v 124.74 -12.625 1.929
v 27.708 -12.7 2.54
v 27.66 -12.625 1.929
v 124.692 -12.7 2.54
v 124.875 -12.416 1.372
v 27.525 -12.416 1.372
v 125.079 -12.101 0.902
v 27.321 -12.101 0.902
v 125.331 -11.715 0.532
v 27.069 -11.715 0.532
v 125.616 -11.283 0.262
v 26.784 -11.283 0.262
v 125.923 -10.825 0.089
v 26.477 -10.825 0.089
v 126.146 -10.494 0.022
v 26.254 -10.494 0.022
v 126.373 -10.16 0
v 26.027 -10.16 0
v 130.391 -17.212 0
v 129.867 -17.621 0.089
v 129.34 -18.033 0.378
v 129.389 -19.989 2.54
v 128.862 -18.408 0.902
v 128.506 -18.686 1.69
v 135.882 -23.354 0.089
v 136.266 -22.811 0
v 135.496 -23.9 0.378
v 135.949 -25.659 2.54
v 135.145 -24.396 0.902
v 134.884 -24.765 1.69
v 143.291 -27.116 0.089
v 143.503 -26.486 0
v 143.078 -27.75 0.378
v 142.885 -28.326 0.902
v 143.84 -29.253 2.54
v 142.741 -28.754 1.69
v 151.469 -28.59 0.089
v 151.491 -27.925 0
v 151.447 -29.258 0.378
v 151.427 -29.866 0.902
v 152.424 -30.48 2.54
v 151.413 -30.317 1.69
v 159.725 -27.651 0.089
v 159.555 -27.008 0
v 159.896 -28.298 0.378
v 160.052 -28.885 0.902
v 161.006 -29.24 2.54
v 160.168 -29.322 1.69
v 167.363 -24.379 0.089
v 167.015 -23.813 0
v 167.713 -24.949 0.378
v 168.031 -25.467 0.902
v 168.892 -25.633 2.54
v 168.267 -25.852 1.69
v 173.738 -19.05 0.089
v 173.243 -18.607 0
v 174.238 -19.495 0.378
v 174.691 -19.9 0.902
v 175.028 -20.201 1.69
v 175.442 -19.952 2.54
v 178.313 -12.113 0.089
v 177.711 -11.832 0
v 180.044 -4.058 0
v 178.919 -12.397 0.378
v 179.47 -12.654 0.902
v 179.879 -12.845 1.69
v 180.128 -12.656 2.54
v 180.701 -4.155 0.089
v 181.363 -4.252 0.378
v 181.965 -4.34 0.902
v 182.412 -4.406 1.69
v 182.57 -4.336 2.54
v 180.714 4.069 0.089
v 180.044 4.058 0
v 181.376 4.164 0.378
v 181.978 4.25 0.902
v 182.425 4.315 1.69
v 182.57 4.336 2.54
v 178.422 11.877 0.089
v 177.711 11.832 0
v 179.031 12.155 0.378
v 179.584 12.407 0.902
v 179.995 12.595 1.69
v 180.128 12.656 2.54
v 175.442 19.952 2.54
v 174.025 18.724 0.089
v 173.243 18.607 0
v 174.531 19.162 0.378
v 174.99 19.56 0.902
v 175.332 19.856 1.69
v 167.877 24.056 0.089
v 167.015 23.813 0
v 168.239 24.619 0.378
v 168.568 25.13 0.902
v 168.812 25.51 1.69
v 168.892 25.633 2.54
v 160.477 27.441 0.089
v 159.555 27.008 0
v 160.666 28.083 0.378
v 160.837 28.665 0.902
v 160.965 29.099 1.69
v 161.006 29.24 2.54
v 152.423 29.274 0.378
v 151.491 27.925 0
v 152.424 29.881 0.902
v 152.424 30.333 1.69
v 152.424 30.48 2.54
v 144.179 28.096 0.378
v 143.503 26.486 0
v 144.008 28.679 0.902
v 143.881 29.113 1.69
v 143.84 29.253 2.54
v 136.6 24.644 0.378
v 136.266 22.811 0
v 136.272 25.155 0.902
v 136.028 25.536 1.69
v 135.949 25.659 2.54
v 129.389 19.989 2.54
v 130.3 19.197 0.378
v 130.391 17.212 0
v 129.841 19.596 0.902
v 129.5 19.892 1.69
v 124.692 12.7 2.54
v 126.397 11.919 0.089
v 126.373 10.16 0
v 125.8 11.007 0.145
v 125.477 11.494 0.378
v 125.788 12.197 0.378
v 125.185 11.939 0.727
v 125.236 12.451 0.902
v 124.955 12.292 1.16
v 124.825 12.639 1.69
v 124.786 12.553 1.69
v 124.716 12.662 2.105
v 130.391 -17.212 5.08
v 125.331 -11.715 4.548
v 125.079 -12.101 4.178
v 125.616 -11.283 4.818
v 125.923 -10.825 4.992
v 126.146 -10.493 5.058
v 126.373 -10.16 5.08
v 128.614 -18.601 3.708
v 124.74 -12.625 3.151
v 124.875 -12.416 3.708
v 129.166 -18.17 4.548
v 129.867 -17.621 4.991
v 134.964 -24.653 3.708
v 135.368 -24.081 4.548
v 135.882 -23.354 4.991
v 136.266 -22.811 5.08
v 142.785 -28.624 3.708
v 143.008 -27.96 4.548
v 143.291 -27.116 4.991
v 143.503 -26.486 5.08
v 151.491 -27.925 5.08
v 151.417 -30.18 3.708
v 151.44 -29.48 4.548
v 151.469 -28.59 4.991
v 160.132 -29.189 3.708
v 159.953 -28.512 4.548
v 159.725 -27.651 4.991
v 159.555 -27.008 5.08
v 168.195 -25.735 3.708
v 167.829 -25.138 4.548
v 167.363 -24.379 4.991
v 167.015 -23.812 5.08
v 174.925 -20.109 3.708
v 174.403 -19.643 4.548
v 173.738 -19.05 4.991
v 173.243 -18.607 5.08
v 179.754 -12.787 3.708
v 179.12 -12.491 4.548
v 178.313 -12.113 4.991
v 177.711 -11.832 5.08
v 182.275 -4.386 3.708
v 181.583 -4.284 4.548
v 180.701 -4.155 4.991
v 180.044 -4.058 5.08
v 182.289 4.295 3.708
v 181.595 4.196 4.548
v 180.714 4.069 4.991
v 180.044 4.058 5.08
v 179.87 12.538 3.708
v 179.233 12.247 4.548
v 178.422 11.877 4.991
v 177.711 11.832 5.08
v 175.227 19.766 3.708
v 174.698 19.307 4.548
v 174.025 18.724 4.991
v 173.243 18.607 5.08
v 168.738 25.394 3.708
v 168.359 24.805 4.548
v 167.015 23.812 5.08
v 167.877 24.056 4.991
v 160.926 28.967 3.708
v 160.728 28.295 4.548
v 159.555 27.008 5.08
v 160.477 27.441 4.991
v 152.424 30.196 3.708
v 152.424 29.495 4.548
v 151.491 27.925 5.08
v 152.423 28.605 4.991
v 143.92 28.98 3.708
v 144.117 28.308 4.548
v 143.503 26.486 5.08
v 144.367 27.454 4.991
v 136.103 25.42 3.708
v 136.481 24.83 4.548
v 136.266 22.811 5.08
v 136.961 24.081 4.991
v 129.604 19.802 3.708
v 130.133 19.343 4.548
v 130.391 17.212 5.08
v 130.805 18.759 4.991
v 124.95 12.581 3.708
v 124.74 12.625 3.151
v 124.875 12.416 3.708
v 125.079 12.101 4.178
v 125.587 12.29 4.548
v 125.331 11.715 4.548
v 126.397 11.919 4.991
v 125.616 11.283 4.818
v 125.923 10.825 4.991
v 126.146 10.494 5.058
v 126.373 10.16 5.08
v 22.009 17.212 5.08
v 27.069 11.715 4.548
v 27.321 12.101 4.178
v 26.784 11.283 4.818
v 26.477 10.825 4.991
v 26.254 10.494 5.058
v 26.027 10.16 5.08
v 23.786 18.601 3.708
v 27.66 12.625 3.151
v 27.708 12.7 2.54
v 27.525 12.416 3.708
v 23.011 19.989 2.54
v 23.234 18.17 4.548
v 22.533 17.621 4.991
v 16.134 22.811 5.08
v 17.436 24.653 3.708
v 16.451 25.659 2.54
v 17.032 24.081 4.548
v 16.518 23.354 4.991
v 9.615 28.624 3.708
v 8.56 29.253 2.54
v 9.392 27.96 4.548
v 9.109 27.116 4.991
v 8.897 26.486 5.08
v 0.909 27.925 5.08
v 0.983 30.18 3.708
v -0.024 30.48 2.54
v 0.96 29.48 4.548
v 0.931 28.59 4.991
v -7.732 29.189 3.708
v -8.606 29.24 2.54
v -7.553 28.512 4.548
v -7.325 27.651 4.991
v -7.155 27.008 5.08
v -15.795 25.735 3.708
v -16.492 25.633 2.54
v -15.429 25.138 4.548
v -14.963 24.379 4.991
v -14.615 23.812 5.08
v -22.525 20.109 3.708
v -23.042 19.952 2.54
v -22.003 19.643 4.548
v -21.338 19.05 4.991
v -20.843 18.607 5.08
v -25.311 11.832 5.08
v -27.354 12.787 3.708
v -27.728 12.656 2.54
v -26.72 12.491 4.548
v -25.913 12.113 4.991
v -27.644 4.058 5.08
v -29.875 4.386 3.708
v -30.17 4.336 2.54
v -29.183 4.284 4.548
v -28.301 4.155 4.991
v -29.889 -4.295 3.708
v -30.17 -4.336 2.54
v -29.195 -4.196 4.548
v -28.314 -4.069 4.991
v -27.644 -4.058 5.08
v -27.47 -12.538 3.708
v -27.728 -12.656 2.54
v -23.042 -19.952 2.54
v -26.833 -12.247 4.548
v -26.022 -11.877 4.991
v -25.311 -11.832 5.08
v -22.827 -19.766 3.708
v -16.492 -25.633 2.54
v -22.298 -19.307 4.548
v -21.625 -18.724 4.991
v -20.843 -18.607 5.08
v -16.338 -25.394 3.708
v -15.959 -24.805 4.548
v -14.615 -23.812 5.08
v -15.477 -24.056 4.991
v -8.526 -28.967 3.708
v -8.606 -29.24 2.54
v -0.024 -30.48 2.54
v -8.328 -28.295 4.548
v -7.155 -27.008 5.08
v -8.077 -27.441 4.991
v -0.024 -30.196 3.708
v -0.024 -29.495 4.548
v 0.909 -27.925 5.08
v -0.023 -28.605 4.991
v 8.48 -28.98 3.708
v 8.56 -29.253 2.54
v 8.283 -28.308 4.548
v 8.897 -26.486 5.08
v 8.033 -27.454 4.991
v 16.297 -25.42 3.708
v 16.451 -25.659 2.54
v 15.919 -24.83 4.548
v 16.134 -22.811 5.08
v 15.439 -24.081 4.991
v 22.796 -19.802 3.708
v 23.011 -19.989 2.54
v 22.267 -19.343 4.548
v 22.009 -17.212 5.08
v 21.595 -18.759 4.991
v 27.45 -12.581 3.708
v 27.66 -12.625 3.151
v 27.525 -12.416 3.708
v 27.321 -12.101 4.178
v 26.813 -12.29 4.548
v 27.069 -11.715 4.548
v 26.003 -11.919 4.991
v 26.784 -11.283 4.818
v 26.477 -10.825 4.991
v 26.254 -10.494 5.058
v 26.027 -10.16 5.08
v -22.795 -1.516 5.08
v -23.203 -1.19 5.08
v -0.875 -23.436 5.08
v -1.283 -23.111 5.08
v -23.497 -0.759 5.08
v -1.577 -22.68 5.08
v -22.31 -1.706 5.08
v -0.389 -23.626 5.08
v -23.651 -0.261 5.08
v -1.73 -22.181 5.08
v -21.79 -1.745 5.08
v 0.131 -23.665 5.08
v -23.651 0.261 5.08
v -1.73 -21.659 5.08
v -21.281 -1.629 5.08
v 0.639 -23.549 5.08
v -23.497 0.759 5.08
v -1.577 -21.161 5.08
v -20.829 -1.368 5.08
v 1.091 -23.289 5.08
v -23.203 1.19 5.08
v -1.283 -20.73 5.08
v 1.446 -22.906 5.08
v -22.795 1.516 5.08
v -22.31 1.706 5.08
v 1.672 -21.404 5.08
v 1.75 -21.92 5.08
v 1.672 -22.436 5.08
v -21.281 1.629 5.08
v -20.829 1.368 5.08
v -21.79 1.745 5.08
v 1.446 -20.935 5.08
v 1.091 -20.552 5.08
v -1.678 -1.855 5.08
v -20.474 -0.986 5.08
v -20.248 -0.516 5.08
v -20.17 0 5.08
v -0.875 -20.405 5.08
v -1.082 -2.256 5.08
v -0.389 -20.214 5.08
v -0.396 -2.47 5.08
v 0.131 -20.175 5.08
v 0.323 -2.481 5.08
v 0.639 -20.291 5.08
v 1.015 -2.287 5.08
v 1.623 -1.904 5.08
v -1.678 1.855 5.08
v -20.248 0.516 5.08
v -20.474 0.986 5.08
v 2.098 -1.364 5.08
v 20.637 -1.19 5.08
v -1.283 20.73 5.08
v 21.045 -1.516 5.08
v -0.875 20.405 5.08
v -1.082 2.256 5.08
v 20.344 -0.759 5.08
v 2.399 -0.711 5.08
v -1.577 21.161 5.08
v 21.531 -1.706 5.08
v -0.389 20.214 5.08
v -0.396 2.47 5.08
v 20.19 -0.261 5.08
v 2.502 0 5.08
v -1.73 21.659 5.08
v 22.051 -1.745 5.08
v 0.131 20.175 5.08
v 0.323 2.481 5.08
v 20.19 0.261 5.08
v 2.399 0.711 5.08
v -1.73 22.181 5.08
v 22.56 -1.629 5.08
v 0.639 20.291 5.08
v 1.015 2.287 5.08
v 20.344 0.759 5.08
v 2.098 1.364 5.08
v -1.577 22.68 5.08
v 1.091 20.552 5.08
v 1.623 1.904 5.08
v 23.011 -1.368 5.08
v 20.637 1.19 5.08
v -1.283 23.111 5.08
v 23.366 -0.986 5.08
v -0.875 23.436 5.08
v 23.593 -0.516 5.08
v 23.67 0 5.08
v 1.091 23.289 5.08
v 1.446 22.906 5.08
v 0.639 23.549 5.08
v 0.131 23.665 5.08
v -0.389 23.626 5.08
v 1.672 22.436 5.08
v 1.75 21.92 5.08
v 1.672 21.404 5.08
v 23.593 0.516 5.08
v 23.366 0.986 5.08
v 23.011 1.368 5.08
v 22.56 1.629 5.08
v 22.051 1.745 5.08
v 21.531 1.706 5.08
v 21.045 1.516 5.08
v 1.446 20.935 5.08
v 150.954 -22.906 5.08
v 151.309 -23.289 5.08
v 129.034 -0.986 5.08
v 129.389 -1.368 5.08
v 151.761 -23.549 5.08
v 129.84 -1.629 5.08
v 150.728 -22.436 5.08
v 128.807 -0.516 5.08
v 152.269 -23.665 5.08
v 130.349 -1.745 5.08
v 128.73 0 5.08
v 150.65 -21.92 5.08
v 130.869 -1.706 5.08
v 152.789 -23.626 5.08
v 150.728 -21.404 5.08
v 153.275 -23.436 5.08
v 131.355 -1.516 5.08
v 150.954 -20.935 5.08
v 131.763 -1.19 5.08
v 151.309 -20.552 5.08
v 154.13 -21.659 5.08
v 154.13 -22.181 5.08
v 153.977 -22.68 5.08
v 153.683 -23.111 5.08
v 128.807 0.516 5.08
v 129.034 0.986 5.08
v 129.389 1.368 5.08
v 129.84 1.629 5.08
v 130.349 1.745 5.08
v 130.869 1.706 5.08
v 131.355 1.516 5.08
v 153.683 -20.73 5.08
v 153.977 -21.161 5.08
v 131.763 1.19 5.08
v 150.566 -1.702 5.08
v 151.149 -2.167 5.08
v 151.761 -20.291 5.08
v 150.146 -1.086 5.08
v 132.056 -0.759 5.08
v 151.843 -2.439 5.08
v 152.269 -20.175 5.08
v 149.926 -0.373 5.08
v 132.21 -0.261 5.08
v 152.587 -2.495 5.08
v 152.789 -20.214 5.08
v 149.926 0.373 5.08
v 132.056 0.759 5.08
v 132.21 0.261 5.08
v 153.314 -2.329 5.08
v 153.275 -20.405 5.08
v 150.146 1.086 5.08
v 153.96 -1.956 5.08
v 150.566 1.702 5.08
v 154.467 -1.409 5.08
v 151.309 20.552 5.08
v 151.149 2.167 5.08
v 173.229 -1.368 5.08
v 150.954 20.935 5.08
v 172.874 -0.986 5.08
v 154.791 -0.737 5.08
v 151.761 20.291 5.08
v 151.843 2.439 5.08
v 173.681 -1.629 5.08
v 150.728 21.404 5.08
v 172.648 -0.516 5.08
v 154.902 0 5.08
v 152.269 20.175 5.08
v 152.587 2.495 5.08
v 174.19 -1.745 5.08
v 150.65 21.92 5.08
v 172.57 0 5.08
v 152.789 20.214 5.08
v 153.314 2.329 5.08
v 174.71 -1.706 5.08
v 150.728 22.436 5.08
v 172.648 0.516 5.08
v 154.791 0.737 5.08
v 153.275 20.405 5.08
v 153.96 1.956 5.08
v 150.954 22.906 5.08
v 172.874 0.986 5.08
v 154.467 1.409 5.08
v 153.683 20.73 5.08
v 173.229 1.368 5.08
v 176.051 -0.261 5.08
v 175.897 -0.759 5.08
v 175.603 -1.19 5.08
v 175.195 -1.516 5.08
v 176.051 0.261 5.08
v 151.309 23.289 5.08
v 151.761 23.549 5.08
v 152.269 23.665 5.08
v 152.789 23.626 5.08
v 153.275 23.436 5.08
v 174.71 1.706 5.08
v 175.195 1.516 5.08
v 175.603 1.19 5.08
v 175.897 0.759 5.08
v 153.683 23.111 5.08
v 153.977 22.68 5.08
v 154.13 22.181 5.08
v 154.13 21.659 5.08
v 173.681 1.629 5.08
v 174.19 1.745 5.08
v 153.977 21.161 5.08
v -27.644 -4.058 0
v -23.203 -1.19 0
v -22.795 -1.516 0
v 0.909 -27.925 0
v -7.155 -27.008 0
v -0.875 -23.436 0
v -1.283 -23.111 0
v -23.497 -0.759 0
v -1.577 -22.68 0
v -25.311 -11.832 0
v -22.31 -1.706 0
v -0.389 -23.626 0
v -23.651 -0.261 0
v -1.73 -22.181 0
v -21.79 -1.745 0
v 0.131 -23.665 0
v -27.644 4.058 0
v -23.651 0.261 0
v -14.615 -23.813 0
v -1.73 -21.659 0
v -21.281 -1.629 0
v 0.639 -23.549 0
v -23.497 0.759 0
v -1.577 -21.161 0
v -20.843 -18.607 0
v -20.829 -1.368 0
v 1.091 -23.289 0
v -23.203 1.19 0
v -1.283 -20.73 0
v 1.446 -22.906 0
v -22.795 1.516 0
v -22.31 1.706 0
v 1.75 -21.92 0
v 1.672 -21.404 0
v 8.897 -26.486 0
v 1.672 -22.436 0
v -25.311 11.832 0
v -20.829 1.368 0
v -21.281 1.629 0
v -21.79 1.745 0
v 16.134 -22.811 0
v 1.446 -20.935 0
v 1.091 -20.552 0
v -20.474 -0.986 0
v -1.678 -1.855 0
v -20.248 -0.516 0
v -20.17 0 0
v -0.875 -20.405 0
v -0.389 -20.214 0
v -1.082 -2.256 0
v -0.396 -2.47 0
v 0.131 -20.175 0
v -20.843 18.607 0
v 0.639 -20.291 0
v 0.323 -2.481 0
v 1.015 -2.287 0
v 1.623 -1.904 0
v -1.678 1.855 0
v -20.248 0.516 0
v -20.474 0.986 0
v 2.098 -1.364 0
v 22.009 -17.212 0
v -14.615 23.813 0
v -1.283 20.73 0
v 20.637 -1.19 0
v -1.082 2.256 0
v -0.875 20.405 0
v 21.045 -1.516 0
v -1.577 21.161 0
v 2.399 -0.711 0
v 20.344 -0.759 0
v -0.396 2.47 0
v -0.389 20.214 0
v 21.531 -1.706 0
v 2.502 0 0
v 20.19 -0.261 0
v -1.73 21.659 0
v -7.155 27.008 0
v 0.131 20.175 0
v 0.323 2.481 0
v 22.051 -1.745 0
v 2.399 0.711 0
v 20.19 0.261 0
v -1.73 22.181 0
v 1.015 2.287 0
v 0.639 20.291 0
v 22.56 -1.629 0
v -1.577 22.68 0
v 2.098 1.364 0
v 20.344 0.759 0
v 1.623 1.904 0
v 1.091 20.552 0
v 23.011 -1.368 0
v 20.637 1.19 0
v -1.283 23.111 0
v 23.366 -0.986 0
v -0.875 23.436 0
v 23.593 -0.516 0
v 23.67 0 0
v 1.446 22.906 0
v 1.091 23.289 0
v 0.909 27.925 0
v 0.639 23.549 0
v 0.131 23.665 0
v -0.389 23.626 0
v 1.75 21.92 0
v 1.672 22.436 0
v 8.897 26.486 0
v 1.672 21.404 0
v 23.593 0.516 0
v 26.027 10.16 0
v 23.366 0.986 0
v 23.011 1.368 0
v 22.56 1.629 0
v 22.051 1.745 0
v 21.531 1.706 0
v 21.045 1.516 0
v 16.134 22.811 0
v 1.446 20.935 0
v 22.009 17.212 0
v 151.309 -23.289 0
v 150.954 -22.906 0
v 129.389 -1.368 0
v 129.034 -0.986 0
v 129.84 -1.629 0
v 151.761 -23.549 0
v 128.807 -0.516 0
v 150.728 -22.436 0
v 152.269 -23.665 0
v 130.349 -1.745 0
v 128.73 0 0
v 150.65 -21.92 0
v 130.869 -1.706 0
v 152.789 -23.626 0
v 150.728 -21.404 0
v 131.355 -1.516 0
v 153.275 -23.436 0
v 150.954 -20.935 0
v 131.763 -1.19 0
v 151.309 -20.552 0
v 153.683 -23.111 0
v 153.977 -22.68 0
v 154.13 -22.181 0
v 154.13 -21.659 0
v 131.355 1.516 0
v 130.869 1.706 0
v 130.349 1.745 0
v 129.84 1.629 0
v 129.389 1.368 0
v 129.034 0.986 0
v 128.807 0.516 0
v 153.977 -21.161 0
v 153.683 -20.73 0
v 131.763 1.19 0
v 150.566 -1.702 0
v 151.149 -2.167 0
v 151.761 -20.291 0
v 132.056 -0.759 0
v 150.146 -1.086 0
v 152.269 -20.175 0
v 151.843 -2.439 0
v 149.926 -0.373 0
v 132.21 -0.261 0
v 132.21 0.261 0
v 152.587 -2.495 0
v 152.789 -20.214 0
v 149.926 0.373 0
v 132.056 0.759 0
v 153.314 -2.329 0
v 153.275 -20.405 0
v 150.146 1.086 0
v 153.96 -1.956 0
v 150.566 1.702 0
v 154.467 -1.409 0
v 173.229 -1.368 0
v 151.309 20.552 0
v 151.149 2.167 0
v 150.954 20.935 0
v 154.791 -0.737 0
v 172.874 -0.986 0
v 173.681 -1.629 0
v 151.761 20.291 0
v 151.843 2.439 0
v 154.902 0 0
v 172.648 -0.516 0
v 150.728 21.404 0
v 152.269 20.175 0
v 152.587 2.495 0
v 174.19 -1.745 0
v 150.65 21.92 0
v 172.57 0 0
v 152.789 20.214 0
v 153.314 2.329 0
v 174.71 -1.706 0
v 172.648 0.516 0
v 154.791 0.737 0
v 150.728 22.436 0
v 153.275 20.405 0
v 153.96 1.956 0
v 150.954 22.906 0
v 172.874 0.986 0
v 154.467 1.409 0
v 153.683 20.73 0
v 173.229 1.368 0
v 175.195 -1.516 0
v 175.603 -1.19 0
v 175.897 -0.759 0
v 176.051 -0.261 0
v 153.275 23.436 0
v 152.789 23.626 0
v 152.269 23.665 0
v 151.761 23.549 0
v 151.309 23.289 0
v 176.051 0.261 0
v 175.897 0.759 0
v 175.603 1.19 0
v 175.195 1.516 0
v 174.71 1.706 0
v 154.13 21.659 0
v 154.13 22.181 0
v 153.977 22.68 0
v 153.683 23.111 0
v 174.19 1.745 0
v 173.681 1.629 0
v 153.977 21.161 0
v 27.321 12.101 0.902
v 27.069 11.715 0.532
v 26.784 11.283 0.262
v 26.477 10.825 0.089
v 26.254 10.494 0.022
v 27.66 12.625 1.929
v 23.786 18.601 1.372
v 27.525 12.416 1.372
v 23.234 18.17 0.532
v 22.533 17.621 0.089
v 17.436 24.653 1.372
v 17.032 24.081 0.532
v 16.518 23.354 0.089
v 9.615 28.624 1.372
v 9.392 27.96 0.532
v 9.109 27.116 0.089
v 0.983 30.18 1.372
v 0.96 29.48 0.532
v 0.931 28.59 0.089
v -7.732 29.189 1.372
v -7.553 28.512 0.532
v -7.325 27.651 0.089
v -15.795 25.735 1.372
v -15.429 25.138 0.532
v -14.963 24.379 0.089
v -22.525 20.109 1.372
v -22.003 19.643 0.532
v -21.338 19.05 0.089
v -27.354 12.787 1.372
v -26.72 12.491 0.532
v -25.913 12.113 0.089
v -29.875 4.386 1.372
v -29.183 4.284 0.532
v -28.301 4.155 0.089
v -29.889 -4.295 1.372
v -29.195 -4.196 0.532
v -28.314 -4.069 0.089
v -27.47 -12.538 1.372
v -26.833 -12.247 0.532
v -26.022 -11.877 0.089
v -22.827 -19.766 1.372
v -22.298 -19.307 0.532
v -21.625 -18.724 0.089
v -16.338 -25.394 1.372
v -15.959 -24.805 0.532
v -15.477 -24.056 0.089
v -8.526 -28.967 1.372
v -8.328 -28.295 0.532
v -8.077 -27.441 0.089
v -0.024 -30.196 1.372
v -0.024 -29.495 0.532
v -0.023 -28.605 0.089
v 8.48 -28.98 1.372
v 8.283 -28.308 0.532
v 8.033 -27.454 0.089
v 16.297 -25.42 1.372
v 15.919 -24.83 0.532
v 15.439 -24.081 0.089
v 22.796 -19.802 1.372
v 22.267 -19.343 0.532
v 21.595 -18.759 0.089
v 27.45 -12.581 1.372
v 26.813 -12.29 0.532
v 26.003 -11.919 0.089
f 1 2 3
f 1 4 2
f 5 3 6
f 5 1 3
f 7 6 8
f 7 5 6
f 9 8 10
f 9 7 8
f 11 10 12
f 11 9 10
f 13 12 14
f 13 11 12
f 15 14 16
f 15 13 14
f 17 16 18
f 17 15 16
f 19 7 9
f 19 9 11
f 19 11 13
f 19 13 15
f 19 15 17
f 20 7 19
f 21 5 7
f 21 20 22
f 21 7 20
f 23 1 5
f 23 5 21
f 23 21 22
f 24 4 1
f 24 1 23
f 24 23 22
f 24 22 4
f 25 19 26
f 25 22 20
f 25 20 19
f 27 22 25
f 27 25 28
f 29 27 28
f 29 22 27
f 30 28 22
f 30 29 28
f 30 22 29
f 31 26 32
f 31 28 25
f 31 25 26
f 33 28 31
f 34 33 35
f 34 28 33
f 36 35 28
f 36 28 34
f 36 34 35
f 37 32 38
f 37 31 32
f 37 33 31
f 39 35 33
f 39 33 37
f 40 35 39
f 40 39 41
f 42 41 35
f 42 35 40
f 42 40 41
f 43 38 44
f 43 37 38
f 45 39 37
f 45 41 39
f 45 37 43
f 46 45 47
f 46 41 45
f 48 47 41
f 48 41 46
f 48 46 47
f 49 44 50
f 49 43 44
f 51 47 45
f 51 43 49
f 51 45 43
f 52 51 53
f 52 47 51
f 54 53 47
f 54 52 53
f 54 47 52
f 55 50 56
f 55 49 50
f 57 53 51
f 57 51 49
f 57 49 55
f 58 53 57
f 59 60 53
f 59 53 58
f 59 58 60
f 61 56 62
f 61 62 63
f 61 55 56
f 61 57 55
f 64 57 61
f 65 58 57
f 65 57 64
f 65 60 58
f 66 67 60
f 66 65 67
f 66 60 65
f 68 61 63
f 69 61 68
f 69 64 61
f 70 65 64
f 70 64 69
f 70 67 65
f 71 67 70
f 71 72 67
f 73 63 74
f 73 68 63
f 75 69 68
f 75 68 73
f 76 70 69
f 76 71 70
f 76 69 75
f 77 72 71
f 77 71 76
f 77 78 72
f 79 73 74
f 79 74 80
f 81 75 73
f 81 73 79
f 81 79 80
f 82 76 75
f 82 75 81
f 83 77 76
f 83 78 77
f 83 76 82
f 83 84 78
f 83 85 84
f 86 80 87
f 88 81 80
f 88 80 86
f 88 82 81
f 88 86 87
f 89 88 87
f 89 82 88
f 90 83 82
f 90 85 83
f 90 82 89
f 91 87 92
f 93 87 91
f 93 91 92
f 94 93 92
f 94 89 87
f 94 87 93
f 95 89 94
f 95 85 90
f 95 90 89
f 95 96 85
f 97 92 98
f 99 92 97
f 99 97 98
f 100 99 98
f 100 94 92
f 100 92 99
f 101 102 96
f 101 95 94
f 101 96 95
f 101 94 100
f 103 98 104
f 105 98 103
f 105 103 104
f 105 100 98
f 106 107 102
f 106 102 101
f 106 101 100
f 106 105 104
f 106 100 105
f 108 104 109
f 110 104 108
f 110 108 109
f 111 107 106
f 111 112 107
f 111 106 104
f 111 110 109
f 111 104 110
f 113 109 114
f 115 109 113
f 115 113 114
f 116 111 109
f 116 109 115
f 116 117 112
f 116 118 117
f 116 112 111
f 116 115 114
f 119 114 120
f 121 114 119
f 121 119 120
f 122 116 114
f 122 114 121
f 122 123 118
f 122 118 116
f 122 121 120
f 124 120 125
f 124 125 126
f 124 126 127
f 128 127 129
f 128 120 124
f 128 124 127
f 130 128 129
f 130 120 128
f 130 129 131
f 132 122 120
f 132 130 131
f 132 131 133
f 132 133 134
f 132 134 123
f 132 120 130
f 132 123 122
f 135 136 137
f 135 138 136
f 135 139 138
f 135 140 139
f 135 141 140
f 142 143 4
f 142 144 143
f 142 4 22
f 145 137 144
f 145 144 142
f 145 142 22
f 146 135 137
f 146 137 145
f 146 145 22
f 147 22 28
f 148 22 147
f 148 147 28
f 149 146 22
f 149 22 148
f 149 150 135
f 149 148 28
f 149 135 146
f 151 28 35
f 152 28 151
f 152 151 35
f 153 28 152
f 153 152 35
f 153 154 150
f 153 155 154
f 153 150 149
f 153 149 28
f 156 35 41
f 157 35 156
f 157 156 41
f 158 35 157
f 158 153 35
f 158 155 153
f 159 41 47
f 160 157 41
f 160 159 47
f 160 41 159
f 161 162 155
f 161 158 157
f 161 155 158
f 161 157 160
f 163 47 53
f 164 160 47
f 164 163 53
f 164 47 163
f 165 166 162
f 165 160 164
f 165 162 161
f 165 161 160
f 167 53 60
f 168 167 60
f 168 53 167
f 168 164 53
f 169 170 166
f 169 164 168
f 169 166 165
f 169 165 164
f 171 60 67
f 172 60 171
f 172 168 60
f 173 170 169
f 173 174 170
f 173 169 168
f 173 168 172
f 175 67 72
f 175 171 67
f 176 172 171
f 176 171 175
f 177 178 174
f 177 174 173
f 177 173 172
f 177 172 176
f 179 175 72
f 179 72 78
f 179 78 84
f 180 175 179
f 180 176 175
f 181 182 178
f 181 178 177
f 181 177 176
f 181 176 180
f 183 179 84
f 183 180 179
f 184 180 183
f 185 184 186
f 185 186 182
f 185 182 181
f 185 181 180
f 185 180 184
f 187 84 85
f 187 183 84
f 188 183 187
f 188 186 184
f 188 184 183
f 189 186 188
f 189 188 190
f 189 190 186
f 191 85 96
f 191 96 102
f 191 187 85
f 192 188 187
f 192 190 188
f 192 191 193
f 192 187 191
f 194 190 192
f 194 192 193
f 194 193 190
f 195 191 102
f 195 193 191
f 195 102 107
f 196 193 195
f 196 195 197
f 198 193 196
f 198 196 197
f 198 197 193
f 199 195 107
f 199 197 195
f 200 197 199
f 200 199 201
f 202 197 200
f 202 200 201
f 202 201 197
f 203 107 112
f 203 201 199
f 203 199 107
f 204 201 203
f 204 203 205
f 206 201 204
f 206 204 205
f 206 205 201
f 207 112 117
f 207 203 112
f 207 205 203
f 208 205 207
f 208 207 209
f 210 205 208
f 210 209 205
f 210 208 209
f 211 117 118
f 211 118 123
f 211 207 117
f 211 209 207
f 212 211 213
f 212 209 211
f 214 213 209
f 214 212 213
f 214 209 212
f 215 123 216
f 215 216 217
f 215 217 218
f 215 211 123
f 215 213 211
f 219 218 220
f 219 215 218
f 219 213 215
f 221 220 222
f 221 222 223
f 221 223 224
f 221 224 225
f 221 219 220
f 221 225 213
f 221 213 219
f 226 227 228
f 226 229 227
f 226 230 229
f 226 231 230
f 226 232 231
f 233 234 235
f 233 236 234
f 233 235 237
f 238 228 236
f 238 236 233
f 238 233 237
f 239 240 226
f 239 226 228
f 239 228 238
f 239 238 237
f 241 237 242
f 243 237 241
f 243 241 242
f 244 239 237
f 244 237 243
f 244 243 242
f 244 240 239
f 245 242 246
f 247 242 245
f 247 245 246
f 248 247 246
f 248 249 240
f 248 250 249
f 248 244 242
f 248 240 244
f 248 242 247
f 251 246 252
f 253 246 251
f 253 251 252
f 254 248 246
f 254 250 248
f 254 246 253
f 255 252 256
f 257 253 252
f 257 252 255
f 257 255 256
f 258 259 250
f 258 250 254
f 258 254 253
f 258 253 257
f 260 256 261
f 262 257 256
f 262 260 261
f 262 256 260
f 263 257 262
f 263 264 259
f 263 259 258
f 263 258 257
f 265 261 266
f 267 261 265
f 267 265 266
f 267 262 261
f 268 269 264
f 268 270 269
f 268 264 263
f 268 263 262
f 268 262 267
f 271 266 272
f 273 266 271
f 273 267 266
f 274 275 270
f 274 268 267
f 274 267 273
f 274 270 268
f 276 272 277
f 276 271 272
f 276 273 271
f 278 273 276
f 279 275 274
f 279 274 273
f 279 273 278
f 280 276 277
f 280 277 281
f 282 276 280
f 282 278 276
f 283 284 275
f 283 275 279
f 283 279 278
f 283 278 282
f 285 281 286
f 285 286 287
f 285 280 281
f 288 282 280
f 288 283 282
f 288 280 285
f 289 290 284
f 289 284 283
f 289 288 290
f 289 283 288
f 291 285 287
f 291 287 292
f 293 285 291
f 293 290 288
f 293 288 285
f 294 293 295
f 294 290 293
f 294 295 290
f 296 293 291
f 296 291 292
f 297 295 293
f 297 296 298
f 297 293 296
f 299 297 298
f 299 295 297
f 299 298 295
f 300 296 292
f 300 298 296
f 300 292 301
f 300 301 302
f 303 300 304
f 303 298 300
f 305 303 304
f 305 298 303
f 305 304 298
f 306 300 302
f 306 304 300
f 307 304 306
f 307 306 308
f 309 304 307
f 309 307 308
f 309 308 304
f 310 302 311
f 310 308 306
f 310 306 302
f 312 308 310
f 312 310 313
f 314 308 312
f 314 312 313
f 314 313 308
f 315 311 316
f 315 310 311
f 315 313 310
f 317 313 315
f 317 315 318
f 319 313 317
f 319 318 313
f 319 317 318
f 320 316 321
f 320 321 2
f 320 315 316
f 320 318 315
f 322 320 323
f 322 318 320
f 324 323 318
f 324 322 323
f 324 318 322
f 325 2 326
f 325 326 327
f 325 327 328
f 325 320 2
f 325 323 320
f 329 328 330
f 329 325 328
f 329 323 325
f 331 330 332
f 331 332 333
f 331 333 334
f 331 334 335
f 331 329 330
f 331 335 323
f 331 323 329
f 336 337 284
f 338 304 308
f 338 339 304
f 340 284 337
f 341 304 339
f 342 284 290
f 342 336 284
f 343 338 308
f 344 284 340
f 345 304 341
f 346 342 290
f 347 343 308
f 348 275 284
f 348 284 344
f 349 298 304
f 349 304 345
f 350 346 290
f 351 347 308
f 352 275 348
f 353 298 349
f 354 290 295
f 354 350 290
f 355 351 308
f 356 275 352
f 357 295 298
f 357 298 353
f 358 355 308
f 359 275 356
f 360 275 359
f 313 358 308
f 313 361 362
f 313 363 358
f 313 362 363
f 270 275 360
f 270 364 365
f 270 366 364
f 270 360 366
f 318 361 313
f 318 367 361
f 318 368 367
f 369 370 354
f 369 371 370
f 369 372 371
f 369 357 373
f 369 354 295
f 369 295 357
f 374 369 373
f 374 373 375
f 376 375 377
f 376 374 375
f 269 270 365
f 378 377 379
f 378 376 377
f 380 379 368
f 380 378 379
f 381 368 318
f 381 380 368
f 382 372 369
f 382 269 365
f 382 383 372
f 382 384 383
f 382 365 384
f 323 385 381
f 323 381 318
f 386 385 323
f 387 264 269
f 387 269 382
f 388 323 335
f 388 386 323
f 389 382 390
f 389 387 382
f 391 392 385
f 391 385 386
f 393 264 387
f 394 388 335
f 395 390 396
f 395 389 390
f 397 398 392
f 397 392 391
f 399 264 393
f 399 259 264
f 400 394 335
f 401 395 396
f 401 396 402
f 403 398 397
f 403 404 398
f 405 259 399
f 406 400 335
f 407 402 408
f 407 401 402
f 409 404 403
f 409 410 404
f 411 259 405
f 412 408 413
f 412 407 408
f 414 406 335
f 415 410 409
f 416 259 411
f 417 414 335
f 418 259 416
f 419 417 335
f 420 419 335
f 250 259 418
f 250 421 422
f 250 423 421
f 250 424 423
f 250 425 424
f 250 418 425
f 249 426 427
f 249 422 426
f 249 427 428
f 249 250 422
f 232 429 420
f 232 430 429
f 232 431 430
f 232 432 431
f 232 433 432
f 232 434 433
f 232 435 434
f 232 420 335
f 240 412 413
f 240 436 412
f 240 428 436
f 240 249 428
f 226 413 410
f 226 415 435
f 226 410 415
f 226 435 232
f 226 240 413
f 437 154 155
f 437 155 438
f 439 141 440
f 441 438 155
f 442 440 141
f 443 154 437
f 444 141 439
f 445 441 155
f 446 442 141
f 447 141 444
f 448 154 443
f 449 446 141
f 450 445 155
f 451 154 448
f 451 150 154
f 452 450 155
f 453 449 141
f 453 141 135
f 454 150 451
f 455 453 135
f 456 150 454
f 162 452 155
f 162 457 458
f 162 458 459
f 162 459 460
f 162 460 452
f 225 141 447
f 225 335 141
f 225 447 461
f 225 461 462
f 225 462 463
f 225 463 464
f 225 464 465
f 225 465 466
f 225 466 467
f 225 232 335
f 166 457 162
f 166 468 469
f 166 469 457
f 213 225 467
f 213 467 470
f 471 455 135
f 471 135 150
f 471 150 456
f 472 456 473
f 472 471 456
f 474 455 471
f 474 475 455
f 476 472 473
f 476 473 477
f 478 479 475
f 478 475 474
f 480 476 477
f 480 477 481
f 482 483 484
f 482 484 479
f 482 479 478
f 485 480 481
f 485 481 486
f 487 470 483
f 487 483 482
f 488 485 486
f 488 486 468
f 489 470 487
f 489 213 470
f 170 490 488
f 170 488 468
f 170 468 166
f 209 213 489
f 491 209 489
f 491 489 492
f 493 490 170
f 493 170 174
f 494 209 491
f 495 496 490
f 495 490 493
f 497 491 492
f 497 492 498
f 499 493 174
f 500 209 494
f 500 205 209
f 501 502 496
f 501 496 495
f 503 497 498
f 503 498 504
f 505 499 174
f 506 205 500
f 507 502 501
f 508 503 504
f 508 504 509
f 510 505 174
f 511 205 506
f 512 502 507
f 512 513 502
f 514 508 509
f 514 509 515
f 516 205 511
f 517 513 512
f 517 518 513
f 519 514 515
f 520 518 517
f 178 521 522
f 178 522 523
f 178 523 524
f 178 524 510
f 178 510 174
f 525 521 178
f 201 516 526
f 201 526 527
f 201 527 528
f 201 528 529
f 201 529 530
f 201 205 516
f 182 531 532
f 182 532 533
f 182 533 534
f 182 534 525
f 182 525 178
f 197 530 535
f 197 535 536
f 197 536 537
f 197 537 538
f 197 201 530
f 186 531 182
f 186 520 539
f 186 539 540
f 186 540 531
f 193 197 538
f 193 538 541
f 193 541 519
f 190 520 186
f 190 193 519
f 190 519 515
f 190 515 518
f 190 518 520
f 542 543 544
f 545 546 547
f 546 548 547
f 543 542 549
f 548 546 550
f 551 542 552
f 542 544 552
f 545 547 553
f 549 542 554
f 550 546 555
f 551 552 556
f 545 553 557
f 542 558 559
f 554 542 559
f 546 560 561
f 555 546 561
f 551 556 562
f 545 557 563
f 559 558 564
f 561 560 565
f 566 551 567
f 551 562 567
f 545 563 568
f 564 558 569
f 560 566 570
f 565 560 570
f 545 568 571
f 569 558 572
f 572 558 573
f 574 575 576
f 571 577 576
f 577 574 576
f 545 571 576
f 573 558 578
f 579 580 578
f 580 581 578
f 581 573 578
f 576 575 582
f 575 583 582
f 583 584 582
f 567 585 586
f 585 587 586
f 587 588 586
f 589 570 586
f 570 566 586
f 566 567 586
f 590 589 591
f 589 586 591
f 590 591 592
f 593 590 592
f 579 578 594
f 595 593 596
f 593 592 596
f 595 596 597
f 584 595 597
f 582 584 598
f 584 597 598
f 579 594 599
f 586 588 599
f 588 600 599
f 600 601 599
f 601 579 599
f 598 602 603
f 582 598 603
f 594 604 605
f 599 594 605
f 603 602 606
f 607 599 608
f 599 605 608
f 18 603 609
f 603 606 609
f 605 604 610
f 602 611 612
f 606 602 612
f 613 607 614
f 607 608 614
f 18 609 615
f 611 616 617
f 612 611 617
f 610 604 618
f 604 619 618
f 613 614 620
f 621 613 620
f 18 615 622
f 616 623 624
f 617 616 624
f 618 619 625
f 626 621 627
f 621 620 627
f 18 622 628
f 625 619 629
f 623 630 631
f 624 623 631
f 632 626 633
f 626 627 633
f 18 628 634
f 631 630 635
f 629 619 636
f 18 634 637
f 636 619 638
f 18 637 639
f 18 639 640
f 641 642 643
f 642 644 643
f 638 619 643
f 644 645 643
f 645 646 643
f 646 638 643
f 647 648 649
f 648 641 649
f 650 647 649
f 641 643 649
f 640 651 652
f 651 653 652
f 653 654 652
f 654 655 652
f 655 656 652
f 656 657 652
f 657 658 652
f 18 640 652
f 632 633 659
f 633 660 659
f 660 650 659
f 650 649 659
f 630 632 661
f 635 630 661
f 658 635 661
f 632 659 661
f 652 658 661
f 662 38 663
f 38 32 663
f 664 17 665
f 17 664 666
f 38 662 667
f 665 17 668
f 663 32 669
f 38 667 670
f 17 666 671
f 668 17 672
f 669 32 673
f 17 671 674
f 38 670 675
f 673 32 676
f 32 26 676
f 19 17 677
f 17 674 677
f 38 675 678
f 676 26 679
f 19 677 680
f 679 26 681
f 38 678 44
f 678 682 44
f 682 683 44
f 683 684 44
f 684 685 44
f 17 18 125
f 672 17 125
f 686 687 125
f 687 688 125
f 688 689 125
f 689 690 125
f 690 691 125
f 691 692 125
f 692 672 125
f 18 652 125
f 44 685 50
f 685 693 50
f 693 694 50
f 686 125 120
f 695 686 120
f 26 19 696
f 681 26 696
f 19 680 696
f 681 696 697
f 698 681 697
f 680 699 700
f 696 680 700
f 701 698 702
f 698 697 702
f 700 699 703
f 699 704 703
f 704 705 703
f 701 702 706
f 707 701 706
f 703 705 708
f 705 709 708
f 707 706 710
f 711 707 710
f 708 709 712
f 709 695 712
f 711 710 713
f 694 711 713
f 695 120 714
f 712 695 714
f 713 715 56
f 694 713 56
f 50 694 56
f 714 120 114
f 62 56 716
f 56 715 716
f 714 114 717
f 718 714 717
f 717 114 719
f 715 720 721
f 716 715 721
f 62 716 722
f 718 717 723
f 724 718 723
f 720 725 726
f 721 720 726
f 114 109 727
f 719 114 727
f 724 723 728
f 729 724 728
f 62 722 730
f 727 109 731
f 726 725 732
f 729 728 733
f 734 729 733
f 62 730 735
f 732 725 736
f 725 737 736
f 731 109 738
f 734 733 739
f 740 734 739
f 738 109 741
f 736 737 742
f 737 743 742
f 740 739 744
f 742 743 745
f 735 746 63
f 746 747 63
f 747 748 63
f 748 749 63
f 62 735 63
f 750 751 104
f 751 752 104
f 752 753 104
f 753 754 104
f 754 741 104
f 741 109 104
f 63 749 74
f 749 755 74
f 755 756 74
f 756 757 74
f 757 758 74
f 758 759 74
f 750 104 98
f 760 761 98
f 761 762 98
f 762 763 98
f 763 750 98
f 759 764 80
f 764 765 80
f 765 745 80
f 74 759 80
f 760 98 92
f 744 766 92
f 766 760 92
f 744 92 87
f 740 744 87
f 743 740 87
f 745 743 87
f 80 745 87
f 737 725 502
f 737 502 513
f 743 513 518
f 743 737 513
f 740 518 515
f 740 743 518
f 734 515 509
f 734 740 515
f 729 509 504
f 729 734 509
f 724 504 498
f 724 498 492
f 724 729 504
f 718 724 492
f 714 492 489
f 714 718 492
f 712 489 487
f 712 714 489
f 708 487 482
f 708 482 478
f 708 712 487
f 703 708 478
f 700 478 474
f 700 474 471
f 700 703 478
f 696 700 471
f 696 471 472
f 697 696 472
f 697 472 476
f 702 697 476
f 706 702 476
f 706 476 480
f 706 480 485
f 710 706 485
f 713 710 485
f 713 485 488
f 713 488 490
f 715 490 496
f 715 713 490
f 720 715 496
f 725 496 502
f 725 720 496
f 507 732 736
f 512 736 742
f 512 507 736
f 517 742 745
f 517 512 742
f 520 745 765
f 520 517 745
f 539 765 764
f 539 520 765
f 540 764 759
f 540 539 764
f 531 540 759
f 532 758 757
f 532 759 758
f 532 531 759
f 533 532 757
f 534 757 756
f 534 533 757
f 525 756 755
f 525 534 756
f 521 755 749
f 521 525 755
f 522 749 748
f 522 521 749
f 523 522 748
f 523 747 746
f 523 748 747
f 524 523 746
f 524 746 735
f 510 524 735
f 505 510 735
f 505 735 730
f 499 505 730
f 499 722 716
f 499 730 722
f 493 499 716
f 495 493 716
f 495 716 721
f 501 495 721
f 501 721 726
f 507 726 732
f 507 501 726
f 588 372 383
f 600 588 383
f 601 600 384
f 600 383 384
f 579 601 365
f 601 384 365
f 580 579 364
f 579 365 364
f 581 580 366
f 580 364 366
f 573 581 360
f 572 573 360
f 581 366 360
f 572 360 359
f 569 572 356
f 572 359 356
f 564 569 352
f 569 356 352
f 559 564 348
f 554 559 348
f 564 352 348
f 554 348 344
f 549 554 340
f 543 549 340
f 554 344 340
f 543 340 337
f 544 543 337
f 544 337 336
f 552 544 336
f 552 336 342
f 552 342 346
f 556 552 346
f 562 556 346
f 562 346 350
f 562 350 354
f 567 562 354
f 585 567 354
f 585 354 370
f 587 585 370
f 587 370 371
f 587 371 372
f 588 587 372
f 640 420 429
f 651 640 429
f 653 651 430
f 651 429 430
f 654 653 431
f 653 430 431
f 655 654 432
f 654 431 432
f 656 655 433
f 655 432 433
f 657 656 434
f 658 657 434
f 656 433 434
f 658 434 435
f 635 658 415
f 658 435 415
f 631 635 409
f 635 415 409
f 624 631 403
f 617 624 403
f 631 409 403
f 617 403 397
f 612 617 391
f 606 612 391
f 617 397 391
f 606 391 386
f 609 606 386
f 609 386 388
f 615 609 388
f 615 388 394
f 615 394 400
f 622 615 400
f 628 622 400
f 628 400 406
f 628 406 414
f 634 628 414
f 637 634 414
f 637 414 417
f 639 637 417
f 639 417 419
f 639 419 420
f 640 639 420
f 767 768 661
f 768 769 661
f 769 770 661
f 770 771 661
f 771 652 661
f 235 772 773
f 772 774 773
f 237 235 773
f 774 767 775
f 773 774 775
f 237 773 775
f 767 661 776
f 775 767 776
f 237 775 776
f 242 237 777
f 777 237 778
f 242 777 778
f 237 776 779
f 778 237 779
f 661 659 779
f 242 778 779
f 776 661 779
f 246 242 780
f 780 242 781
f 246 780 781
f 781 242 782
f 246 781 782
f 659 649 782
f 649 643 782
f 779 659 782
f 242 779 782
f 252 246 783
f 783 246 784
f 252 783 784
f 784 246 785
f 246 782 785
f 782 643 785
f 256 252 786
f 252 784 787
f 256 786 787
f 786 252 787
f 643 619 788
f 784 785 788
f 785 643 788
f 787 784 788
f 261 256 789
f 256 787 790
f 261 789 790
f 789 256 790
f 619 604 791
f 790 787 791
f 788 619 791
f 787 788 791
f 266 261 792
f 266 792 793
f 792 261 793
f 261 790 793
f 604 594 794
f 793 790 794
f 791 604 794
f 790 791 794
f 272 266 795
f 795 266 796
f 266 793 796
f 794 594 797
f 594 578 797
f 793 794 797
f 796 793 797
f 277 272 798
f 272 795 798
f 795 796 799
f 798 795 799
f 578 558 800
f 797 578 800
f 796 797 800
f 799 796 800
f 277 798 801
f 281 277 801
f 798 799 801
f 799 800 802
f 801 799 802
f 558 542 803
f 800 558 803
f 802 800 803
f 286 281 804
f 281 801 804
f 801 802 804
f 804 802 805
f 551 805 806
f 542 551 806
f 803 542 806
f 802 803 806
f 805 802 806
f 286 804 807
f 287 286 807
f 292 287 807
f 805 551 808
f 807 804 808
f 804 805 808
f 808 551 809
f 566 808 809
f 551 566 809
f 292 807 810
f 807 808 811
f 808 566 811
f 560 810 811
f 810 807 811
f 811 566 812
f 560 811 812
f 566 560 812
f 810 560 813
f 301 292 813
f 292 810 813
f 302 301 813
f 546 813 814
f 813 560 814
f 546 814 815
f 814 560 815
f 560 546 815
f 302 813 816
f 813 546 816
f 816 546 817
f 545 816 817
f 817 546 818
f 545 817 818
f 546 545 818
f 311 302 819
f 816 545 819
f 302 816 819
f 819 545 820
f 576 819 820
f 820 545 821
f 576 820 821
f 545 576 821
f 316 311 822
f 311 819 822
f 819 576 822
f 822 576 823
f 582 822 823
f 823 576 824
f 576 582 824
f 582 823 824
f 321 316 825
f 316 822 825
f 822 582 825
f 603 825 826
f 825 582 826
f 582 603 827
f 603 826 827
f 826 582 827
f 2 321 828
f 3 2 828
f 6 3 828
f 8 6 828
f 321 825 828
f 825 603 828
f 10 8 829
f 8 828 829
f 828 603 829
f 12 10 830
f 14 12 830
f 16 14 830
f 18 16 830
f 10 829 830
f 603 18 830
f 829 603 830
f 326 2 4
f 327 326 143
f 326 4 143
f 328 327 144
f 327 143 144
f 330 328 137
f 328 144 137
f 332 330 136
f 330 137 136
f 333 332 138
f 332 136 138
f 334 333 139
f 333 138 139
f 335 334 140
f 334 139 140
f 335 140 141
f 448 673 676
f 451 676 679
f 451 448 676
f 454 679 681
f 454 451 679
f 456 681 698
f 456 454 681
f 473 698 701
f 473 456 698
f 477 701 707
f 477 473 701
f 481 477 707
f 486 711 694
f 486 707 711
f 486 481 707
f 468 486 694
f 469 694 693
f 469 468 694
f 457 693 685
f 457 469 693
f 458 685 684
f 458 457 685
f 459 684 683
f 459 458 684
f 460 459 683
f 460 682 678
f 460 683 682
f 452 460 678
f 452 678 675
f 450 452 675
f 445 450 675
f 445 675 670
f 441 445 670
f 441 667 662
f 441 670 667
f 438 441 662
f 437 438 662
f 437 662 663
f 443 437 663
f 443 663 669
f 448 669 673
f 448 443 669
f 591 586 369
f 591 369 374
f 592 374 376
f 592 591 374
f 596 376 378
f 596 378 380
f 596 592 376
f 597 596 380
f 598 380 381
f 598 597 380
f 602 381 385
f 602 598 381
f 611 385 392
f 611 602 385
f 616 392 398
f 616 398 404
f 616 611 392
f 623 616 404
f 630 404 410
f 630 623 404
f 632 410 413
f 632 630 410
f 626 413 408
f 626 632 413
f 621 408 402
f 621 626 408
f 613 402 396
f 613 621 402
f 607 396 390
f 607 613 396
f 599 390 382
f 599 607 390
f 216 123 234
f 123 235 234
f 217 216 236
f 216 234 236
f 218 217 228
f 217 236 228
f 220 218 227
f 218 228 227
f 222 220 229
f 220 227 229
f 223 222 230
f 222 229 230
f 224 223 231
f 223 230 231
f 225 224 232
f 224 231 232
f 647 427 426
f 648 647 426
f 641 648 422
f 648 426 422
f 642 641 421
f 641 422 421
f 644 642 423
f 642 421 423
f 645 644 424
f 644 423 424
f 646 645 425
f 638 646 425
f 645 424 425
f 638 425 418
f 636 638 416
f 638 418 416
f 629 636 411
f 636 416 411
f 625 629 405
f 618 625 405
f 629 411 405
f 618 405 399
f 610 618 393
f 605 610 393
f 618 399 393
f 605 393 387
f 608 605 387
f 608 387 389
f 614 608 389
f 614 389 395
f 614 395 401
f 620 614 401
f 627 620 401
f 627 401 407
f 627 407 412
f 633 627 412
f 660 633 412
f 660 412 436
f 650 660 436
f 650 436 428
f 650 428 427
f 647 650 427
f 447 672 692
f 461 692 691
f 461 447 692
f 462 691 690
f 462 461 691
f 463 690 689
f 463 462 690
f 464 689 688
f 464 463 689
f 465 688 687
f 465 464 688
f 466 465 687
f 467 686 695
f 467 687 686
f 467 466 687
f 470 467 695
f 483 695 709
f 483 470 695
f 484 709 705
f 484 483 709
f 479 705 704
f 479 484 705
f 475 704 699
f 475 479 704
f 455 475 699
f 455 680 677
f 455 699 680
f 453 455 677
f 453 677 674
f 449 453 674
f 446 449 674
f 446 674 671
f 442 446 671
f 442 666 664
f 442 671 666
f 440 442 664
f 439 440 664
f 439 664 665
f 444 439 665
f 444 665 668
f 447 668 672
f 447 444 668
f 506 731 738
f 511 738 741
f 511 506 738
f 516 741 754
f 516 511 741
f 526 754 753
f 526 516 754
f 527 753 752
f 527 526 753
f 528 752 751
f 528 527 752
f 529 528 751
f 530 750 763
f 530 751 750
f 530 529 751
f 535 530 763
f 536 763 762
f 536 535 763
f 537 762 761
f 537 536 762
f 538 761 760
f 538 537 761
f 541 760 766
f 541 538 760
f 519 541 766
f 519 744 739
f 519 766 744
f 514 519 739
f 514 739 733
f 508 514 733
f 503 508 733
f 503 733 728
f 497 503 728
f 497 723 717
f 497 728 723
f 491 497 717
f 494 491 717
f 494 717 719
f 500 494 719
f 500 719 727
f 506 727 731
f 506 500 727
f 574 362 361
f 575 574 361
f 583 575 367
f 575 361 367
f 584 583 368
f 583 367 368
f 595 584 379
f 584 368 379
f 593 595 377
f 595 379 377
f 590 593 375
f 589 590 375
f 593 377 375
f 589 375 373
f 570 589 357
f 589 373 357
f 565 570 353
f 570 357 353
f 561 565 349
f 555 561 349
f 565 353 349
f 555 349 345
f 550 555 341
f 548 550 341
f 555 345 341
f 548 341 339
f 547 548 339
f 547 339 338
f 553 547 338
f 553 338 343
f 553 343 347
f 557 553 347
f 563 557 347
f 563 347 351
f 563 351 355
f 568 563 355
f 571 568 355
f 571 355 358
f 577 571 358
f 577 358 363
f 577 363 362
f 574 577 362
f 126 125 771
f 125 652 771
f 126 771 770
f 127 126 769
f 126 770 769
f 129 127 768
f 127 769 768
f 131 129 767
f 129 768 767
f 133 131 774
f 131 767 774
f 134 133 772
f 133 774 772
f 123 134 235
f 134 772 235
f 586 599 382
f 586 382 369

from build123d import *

# Parameters (mm, degrees)
SKETCH1_R           = 2.5019
BOSS_EXTRUDE1_DEPTH = 5.08
FILLET1_R           = 2.54
FILLET2_R           = 2.54
SKETCH2_R           = 1.75
CUT_EXTRUDE1_DEPTH  = 186.472184555


with BuildPart() as part:
    # Sketch1 → Boss-Extrude1 (new body)
    with BuildSketch(Plane.XY):
        with BuildLine():
            Line((27.708128771, -12.7), (124.691871229, -12.7))
            ThreePointArc((124.691871229, -12.7), (182.88, 0), (124.691871229, 12.7))
            Line((124.691871229, 12.7), (27.708128771, 12.7))
            ThreePointArc((27.708128771, 12.7), (-30.48, 0), (27.708128771, -12.7))
        make_face()
        with Locations((152.4, 0)):
            Circle(SKETCH1_R, mode=Mode.SUBTRACT)
        with BuildLine():
            Line((-1.67829283, 1.855488288), (-1.67829283, -1.855488288))
            ThreePointArc((-1.67829283, -1.855488288), (2.5019, 0), (-1.67829283, 1.855488288))
        make_face(mode=Mode.SUBTRACT)
    extrude(amount=BOSS_EXTRUDE1_DEPTH)

    # Fillet1
    fillet1_edges = [part.edges().sort_by_distance(p)[0] for p in [
        (-30.48, 0, 5.08),
        (76.2, -12.7, 5.08),
        (182.88, 0, 5.08),
        (76.2, 12.7, 5.08),
    ]]
    fillet(fillet1_edges, radius=FILLET1_R)

    # Fillet2
    fillet2_edges = [part.edges().sort_by_distance(p)[0] for p in [
        (76.2, -12.7, 0),
        (-30.48, 0, 0),
        (76.2, 12.7, 0),
        (182.88, 0, 0),
    ]]
    fillet(fillet2_edges, radius=FILLET2_R - 0.0001)  # a hair under: the kernel refuses the full size

    # Sketch2 → Cut-Extrude1 (cut, through all)
    with BuildSketch(Plane.XY.offset(5.08)):
        with Locations((21.920310217, 0)):
            Circle(SKETCH2_R)
        with Locations((0, -21.920310217)):
            Circle(SKETCH2_R)
        with Locations((-21.920310217, 0)):
            Circle(SKETCH2_R)
        with Locations((0, 21.920310217)):
            Circle(SKETCH2_R)
    cut_extrude1 = extrude(amount=-CUT_EXTRUDE1_DEPTH, mode=Mode.SUBTRACT)

    # Mirror1: Cut-Extrude1 across plane
    add(cut_extrude1.mirror(Plane(origin=(76.2, 0, 0), x_dir=(0, 0, 1), z_dir=(1, 0, 0))), mode=Mode.SUBTRACT)


solid = part.part
